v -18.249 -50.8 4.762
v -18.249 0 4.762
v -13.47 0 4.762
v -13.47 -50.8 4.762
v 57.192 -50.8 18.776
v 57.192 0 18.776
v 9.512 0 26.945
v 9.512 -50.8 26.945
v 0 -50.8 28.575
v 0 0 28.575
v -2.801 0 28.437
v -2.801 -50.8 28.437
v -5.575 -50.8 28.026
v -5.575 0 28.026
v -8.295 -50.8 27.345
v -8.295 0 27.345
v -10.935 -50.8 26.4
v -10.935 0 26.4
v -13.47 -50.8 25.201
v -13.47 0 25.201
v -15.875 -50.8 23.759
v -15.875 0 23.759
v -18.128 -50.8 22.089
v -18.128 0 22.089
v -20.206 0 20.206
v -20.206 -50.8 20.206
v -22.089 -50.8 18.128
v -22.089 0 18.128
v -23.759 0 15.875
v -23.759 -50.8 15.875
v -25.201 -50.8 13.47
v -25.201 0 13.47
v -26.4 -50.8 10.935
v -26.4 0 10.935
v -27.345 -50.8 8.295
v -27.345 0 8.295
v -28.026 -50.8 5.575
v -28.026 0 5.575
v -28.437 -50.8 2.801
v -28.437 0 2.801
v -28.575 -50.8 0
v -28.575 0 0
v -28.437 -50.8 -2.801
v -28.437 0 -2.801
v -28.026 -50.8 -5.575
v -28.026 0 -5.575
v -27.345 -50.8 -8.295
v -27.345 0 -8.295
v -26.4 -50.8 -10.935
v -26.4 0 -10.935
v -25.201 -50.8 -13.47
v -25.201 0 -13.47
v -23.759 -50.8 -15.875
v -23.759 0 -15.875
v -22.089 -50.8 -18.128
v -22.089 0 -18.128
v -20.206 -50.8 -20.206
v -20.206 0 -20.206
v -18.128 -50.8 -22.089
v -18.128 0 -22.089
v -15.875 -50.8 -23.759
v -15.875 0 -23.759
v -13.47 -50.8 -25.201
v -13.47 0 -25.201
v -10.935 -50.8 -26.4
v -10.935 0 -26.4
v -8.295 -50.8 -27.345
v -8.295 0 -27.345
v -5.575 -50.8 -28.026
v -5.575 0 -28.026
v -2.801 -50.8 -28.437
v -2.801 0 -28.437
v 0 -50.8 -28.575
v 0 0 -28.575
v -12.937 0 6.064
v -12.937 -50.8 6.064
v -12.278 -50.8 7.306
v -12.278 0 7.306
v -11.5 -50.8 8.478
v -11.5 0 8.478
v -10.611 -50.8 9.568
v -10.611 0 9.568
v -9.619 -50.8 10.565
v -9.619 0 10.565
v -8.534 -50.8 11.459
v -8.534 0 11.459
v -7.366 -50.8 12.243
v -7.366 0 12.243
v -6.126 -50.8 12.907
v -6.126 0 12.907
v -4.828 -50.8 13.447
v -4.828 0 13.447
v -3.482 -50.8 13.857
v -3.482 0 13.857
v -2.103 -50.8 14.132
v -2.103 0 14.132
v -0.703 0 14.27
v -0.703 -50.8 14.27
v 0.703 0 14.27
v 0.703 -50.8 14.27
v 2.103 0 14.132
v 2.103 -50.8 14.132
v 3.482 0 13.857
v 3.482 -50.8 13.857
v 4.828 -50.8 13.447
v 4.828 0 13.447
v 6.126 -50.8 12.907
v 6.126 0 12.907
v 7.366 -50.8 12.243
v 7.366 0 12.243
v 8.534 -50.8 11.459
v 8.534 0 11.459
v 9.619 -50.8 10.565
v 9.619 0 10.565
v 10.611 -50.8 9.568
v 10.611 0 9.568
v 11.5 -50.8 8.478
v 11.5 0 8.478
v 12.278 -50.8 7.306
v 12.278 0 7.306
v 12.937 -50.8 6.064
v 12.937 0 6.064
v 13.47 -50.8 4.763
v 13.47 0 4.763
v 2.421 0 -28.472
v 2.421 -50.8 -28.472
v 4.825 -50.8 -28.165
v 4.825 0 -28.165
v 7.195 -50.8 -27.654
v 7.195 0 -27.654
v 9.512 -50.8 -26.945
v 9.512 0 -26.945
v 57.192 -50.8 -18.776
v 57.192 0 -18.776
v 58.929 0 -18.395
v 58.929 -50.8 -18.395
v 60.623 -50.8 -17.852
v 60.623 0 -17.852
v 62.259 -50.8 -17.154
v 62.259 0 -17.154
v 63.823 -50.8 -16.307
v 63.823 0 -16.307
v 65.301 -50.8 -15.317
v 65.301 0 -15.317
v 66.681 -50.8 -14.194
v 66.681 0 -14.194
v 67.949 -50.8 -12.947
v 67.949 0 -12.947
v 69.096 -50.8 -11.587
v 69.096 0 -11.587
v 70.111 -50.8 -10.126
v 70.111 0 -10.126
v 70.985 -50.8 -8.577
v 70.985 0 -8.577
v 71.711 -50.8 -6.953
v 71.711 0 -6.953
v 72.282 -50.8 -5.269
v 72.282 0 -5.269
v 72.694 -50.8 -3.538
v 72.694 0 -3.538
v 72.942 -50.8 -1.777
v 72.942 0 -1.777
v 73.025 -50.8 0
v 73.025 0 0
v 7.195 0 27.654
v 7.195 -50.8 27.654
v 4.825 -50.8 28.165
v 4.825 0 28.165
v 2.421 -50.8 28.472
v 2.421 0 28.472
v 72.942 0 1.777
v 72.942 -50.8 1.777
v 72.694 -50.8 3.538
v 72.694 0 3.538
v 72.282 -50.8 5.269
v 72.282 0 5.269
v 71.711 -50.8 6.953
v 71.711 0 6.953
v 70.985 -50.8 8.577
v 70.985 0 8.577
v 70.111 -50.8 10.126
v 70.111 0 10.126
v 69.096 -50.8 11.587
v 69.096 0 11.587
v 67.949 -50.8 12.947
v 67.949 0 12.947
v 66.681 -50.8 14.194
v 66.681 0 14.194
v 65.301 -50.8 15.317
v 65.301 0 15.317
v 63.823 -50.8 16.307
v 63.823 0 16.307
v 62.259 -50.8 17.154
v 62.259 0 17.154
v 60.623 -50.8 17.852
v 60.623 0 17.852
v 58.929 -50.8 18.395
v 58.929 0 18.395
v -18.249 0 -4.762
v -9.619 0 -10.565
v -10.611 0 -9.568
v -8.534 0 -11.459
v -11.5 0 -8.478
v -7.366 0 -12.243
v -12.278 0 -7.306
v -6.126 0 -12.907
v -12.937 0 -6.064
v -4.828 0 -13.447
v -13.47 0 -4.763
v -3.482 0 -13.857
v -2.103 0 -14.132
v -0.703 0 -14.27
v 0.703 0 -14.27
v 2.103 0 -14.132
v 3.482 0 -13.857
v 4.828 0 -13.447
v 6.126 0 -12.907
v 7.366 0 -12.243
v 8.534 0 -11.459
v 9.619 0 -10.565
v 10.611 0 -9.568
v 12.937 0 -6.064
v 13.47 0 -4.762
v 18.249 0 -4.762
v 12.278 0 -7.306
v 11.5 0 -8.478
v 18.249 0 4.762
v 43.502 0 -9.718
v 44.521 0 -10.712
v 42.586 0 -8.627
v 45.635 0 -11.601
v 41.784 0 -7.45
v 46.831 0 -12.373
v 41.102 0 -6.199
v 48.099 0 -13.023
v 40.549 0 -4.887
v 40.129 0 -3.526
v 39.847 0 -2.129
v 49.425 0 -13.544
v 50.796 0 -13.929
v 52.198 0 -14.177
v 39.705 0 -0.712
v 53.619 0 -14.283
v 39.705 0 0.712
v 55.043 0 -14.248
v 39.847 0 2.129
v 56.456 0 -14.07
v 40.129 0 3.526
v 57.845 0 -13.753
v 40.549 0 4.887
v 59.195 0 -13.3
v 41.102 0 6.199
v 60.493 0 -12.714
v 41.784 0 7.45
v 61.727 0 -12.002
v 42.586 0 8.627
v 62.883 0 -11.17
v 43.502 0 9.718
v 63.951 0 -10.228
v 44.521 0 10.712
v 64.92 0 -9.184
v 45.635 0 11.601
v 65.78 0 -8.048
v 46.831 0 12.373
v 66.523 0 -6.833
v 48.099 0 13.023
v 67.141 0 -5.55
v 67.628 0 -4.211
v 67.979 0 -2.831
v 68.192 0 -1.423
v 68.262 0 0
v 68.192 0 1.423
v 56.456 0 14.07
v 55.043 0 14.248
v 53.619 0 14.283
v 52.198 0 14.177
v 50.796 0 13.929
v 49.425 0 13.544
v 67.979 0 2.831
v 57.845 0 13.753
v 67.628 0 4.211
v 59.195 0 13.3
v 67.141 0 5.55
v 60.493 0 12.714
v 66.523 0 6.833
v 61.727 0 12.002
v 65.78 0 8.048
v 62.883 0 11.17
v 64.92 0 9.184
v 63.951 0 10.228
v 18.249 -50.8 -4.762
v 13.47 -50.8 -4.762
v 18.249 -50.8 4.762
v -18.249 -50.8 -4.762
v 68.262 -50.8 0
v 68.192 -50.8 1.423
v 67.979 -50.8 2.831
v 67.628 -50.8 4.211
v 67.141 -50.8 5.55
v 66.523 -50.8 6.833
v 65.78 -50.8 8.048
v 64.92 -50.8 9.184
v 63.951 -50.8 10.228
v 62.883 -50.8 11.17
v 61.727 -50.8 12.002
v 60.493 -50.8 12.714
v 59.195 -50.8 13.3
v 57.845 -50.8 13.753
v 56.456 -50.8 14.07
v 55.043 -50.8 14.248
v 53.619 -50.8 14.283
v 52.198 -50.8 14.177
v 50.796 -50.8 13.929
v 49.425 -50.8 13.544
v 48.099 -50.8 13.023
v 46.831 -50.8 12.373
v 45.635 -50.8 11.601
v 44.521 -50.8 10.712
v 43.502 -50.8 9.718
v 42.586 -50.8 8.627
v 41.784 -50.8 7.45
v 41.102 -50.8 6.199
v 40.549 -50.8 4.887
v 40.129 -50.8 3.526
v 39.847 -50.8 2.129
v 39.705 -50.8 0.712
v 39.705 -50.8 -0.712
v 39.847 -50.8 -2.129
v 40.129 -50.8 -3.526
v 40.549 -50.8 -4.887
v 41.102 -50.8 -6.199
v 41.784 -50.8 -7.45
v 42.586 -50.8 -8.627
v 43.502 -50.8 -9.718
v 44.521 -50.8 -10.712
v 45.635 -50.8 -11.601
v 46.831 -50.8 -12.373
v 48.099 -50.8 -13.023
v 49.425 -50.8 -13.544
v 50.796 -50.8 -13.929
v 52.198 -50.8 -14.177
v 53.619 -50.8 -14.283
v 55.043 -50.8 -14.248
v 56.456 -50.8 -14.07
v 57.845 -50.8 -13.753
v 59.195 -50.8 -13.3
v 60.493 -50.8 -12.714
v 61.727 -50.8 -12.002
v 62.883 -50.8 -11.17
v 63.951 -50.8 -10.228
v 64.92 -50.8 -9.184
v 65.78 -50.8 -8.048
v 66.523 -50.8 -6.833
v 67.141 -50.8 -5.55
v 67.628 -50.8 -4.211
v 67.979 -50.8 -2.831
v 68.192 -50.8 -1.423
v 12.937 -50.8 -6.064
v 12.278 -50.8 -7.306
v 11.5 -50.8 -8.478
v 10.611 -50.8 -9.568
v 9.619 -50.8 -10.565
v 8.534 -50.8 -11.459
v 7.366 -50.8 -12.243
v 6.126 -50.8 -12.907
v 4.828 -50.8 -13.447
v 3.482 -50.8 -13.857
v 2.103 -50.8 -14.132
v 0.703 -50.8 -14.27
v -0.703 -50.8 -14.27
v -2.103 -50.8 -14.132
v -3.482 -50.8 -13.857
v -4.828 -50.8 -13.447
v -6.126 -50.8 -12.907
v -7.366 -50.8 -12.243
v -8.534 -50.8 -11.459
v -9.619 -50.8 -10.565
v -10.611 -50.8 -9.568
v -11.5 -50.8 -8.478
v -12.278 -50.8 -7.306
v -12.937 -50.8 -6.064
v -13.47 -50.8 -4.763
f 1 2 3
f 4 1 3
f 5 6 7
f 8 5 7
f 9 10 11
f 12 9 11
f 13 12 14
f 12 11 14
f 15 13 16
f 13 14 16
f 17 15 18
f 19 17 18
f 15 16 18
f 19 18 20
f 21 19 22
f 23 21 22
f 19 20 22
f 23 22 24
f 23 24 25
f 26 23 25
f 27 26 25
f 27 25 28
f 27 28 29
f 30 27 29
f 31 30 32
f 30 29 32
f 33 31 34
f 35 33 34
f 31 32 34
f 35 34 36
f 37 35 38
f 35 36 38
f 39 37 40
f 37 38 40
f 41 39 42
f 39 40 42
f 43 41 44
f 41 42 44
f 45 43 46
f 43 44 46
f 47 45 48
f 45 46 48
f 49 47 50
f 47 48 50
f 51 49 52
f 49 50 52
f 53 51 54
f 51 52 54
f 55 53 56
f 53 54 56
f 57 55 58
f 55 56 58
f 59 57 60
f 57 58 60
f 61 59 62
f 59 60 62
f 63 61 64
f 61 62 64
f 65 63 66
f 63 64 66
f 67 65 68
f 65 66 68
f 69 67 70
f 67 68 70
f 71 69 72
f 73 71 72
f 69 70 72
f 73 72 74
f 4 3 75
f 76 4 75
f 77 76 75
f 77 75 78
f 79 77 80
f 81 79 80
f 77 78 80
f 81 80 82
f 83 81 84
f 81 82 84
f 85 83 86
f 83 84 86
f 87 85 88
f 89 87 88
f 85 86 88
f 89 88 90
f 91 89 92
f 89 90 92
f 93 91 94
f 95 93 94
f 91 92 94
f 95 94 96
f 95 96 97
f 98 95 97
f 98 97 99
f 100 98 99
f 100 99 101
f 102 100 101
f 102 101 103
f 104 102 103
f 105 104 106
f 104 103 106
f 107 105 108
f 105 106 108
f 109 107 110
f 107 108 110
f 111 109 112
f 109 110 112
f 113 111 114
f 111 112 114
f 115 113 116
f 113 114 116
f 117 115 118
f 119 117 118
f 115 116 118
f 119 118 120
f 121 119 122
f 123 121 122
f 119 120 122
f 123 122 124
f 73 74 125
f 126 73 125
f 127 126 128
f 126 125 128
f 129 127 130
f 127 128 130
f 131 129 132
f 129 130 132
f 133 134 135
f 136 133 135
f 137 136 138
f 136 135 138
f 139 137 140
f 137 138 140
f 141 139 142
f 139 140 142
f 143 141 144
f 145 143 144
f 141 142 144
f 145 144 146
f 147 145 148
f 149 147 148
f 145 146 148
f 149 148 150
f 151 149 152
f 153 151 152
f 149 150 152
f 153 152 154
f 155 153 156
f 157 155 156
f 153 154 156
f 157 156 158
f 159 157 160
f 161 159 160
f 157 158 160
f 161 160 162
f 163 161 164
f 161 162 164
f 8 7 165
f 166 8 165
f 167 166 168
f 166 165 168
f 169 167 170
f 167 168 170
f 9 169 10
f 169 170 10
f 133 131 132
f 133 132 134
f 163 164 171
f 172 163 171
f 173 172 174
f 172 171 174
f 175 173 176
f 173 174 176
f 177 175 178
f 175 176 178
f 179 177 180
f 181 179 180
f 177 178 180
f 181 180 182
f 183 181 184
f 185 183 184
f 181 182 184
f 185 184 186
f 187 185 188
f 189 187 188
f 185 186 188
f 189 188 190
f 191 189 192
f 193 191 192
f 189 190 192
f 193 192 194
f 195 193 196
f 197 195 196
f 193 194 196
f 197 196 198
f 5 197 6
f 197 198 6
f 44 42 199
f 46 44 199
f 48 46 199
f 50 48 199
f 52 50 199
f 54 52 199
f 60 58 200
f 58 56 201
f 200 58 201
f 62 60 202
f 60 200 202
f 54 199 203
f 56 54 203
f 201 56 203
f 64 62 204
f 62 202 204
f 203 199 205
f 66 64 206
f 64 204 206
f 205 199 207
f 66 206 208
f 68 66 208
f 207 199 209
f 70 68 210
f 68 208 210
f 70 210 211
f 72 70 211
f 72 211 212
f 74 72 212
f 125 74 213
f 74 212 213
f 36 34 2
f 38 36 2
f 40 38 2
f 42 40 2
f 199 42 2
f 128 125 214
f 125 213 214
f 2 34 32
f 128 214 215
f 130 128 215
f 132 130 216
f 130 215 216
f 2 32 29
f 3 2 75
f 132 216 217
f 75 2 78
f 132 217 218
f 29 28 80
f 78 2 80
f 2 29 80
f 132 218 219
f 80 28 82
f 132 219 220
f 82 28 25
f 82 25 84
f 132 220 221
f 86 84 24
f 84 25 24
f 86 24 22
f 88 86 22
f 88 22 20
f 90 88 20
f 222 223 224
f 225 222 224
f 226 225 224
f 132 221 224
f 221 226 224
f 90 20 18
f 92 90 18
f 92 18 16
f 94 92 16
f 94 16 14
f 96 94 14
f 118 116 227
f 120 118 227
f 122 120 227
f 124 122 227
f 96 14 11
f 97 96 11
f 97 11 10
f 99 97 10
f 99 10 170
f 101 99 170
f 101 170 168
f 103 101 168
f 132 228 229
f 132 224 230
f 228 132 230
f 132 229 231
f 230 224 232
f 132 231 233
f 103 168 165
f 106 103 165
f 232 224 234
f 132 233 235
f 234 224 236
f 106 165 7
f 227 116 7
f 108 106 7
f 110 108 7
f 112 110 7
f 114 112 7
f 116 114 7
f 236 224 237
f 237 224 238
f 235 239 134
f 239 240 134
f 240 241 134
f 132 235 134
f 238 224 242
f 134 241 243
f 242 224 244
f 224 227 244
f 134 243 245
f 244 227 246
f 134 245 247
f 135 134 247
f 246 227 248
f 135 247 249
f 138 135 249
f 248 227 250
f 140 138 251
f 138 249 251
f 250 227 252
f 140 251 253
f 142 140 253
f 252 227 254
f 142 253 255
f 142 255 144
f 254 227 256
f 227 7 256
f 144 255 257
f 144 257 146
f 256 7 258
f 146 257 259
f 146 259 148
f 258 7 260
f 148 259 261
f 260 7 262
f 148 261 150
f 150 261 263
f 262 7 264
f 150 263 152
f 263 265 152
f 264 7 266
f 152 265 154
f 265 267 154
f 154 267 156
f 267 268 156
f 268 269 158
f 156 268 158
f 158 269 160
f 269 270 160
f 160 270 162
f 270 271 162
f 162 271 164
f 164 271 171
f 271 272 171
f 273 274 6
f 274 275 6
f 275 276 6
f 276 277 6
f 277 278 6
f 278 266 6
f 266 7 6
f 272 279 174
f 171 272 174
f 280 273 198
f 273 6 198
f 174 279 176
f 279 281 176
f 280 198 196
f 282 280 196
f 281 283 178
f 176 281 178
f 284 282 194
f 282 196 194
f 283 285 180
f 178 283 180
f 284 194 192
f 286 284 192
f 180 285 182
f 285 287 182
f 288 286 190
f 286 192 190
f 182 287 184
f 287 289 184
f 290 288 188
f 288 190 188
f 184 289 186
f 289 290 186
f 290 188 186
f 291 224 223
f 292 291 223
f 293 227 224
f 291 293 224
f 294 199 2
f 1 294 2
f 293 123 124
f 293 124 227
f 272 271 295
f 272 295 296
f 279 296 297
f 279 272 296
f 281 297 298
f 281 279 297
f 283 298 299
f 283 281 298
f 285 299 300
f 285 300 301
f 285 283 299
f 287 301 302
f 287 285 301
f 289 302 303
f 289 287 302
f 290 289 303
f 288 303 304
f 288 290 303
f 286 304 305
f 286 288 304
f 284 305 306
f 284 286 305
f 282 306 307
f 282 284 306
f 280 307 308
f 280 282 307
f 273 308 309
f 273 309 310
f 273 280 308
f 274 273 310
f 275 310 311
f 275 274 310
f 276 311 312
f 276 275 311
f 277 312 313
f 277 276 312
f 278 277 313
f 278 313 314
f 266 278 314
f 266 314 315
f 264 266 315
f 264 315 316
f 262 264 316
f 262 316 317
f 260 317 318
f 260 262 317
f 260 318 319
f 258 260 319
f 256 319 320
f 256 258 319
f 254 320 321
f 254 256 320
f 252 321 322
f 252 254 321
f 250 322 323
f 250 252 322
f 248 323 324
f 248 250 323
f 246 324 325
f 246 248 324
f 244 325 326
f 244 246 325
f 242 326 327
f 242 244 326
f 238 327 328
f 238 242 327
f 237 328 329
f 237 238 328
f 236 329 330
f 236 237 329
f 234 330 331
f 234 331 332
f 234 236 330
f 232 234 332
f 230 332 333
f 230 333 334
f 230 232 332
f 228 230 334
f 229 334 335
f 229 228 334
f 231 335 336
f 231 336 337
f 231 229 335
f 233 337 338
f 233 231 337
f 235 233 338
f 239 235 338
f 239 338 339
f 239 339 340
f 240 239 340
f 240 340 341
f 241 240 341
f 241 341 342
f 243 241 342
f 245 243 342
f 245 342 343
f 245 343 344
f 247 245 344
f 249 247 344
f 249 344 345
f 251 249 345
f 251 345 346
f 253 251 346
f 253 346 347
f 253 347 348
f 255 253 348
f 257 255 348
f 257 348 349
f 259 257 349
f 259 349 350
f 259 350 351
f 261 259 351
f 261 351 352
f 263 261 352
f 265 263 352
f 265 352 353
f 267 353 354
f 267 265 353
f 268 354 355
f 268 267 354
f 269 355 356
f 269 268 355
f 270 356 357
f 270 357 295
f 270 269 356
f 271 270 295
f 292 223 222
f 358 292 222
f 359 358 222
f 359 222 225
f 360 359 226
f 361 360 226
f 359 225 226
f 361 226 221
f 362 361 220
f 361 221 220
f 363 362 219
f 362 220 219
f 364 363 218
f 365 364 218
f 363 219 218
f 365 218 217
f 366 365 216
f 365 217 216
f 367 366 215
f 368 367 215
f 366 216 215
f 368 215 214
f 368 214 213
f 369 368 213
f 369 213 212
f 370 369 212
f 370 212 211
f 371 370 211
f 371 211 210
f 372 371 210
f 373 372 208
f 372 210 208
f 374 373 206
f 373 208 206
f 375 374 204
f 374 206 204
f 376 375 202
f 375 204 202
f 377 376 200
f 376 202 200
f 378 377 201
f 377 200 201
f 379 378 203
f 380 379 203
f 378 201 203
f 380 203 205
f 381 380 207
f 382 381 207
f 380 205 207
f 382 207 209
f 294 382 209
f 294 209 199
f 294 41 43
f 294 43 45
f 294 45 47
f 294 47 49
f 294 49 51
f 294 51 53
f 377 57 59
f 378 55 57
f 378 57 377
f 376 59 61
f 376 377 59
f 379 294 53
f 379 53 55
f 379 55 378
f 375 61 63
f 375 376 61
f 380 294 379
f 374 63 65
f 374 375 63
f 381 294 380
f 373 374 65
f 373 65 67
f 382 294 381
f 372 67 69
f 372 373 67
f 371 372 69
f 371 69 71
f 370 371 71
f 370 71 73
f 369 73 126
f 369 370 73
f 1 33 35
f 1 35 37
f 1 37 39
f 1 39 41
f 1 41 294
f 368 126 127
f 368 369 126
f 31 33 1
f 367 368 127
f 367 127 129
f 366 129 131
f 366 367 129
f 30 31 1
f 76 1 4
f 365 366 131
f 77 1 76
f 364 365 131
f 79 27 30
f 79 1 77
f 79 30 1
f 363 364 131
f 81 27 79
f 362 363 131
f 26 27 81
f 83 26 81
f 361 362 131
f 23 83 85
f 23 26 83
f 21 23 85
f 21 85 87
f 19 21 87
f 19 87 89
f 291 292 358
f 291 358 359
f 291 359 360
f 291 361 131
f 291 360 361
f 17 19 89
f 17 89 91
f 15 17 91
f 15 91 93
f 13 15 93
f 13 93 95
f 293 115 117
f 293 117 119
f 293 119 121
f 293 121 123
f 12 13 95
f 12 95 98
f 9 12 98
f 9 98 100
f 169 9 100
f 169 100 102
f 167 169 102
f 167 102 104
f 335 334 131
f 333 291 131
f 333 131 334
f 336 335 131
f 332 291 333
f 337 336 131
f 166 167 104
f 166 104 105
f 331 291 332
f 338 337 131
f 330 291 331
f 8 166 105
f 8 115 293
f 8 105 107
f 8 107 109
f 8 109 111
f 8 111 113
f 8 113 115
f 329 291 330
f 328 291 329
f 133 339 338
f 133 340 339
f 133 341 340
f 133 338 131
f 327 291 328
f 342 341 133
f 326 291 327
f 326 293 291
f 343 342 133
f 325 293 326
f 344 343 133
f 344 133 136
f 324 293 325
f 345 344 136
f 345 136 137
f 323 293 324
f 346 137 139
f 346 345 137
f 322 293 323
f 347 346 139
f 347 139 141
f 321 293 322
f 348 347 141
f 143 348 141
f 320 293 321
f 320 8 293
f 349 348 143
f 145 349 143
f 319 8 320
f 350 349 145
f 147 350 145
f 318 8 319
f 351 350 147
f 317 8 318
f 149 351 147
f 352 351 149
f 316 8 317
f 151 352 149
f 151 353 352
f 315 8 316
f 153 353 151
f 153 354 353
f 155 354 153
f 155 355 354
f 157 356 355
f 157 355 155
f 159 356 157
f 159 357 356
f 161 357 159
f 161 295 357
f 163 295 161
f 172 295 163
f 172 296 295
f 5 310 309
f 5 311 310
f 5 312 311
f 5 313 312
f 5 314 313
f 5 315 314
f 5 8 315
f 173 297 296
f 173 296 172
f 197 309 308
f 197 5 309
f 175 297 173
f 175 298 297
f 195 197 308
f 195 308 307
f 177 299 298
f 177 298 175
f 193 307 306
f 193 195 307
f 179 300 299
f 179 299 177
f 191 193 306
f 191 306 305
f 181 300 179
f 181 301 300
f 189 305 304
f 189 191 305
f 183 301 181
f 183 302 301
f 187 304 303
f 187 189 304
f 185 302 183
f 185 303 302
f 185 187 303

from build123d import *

# Parameters (mm, degrees)
F0_R     = 14.2875
F1_DEPTH = 50.8


with BuildPart() as f1:
    # F0 (on Front) → F1 (new body)
    with BuildSketch(Plane.XZ):
        with BuildLine():
            Line((9.512184, 26.945296), (0, 28.575))
            ThreePointArc((0, 28.575), (-28.575, 0), (0, -28.575))
            Line((0, -28.575), (9.512184, -26.945296))
            ThreePointArc((9.512184, -26.945296), (23.327466, -16.503332), (28.575, 0))
            ThreePointArc((28.575, 0), (23.327466, 16.503332), (9.512184, 26.945296))
        make_face()
        with BuildLine():
            ThreePointArc((-13.470384, 4.7625), (0, 14.2875), (13.470384, 4.7625))
            Line((13.470384, 4.7625), (18.248519, 4.7625))
            Line((18.248519, 4.7625), (18.248519, -4.7625))
            Line((18.248519, -4.7625), (13.470384, -4.7625))
            ThreePointArc((13.470384, -4.7625), (0, -14.2875), (-13.470384, -4.7625))
            Line((-13.470384, -4.7625), (-18.248519, -4.7625))
            Line((-18.248519, -4.7625), (-18.248519, 4.7625))
            Line((-18.248519, 4.7625), (-13.470384, 4.7625))
        make_face(mode=Mode.SUBTRACT)
        with BuildLine():
            ThreePointArc((9.512184, 26.945296), (4.825391, 28.164627), (0, 28.575))
            Line((0, 28.575), (9.512184, 26.945296))
        make_face()
        with BuildLine():
            Line((9.512184, -26.945296), (0, -28.575))
            ThreePointArc((0, -28.575), (4.825391, -28.164627), (9.512184, -26.945296))
        make_face()
        with BuildLine():
            Line((57.191927, 18.776418), (9.512184, 26.945296))
            ThreePointArc((9.512184, 26.945296), (23.327466, 16.503332), (28.575, 0))
            ThreePointArc((28.575, 0), (23.327466, -16.503332), (9.512184, -26.945296))
            Line((9.512184, -26.945296), (57.191927, -18.776418))
            ThreePointArc((57.191927, -18.776418), (34.925, 0), (57.191927, 18.776418))
        make_face()
        with BuildLine():
            ThreePointArc((73.025, 0), (68.538395, 12.280473), (57.191927, 18.776418))
            ThreePointArc((57.191927, 18.776418), (34.925, 0), (57.191927, -18.776418))
            ThreePointArc((57.191927, -18.776418), (68.538395, -12.280473), (73.025, 0))
        make_face()
        with Locations((53.975, 0)):
            Circle(F0_R, mode=Mode.SUBTRACT)
    extrude(amount=F1_DEPTH)


solid = f1.part
